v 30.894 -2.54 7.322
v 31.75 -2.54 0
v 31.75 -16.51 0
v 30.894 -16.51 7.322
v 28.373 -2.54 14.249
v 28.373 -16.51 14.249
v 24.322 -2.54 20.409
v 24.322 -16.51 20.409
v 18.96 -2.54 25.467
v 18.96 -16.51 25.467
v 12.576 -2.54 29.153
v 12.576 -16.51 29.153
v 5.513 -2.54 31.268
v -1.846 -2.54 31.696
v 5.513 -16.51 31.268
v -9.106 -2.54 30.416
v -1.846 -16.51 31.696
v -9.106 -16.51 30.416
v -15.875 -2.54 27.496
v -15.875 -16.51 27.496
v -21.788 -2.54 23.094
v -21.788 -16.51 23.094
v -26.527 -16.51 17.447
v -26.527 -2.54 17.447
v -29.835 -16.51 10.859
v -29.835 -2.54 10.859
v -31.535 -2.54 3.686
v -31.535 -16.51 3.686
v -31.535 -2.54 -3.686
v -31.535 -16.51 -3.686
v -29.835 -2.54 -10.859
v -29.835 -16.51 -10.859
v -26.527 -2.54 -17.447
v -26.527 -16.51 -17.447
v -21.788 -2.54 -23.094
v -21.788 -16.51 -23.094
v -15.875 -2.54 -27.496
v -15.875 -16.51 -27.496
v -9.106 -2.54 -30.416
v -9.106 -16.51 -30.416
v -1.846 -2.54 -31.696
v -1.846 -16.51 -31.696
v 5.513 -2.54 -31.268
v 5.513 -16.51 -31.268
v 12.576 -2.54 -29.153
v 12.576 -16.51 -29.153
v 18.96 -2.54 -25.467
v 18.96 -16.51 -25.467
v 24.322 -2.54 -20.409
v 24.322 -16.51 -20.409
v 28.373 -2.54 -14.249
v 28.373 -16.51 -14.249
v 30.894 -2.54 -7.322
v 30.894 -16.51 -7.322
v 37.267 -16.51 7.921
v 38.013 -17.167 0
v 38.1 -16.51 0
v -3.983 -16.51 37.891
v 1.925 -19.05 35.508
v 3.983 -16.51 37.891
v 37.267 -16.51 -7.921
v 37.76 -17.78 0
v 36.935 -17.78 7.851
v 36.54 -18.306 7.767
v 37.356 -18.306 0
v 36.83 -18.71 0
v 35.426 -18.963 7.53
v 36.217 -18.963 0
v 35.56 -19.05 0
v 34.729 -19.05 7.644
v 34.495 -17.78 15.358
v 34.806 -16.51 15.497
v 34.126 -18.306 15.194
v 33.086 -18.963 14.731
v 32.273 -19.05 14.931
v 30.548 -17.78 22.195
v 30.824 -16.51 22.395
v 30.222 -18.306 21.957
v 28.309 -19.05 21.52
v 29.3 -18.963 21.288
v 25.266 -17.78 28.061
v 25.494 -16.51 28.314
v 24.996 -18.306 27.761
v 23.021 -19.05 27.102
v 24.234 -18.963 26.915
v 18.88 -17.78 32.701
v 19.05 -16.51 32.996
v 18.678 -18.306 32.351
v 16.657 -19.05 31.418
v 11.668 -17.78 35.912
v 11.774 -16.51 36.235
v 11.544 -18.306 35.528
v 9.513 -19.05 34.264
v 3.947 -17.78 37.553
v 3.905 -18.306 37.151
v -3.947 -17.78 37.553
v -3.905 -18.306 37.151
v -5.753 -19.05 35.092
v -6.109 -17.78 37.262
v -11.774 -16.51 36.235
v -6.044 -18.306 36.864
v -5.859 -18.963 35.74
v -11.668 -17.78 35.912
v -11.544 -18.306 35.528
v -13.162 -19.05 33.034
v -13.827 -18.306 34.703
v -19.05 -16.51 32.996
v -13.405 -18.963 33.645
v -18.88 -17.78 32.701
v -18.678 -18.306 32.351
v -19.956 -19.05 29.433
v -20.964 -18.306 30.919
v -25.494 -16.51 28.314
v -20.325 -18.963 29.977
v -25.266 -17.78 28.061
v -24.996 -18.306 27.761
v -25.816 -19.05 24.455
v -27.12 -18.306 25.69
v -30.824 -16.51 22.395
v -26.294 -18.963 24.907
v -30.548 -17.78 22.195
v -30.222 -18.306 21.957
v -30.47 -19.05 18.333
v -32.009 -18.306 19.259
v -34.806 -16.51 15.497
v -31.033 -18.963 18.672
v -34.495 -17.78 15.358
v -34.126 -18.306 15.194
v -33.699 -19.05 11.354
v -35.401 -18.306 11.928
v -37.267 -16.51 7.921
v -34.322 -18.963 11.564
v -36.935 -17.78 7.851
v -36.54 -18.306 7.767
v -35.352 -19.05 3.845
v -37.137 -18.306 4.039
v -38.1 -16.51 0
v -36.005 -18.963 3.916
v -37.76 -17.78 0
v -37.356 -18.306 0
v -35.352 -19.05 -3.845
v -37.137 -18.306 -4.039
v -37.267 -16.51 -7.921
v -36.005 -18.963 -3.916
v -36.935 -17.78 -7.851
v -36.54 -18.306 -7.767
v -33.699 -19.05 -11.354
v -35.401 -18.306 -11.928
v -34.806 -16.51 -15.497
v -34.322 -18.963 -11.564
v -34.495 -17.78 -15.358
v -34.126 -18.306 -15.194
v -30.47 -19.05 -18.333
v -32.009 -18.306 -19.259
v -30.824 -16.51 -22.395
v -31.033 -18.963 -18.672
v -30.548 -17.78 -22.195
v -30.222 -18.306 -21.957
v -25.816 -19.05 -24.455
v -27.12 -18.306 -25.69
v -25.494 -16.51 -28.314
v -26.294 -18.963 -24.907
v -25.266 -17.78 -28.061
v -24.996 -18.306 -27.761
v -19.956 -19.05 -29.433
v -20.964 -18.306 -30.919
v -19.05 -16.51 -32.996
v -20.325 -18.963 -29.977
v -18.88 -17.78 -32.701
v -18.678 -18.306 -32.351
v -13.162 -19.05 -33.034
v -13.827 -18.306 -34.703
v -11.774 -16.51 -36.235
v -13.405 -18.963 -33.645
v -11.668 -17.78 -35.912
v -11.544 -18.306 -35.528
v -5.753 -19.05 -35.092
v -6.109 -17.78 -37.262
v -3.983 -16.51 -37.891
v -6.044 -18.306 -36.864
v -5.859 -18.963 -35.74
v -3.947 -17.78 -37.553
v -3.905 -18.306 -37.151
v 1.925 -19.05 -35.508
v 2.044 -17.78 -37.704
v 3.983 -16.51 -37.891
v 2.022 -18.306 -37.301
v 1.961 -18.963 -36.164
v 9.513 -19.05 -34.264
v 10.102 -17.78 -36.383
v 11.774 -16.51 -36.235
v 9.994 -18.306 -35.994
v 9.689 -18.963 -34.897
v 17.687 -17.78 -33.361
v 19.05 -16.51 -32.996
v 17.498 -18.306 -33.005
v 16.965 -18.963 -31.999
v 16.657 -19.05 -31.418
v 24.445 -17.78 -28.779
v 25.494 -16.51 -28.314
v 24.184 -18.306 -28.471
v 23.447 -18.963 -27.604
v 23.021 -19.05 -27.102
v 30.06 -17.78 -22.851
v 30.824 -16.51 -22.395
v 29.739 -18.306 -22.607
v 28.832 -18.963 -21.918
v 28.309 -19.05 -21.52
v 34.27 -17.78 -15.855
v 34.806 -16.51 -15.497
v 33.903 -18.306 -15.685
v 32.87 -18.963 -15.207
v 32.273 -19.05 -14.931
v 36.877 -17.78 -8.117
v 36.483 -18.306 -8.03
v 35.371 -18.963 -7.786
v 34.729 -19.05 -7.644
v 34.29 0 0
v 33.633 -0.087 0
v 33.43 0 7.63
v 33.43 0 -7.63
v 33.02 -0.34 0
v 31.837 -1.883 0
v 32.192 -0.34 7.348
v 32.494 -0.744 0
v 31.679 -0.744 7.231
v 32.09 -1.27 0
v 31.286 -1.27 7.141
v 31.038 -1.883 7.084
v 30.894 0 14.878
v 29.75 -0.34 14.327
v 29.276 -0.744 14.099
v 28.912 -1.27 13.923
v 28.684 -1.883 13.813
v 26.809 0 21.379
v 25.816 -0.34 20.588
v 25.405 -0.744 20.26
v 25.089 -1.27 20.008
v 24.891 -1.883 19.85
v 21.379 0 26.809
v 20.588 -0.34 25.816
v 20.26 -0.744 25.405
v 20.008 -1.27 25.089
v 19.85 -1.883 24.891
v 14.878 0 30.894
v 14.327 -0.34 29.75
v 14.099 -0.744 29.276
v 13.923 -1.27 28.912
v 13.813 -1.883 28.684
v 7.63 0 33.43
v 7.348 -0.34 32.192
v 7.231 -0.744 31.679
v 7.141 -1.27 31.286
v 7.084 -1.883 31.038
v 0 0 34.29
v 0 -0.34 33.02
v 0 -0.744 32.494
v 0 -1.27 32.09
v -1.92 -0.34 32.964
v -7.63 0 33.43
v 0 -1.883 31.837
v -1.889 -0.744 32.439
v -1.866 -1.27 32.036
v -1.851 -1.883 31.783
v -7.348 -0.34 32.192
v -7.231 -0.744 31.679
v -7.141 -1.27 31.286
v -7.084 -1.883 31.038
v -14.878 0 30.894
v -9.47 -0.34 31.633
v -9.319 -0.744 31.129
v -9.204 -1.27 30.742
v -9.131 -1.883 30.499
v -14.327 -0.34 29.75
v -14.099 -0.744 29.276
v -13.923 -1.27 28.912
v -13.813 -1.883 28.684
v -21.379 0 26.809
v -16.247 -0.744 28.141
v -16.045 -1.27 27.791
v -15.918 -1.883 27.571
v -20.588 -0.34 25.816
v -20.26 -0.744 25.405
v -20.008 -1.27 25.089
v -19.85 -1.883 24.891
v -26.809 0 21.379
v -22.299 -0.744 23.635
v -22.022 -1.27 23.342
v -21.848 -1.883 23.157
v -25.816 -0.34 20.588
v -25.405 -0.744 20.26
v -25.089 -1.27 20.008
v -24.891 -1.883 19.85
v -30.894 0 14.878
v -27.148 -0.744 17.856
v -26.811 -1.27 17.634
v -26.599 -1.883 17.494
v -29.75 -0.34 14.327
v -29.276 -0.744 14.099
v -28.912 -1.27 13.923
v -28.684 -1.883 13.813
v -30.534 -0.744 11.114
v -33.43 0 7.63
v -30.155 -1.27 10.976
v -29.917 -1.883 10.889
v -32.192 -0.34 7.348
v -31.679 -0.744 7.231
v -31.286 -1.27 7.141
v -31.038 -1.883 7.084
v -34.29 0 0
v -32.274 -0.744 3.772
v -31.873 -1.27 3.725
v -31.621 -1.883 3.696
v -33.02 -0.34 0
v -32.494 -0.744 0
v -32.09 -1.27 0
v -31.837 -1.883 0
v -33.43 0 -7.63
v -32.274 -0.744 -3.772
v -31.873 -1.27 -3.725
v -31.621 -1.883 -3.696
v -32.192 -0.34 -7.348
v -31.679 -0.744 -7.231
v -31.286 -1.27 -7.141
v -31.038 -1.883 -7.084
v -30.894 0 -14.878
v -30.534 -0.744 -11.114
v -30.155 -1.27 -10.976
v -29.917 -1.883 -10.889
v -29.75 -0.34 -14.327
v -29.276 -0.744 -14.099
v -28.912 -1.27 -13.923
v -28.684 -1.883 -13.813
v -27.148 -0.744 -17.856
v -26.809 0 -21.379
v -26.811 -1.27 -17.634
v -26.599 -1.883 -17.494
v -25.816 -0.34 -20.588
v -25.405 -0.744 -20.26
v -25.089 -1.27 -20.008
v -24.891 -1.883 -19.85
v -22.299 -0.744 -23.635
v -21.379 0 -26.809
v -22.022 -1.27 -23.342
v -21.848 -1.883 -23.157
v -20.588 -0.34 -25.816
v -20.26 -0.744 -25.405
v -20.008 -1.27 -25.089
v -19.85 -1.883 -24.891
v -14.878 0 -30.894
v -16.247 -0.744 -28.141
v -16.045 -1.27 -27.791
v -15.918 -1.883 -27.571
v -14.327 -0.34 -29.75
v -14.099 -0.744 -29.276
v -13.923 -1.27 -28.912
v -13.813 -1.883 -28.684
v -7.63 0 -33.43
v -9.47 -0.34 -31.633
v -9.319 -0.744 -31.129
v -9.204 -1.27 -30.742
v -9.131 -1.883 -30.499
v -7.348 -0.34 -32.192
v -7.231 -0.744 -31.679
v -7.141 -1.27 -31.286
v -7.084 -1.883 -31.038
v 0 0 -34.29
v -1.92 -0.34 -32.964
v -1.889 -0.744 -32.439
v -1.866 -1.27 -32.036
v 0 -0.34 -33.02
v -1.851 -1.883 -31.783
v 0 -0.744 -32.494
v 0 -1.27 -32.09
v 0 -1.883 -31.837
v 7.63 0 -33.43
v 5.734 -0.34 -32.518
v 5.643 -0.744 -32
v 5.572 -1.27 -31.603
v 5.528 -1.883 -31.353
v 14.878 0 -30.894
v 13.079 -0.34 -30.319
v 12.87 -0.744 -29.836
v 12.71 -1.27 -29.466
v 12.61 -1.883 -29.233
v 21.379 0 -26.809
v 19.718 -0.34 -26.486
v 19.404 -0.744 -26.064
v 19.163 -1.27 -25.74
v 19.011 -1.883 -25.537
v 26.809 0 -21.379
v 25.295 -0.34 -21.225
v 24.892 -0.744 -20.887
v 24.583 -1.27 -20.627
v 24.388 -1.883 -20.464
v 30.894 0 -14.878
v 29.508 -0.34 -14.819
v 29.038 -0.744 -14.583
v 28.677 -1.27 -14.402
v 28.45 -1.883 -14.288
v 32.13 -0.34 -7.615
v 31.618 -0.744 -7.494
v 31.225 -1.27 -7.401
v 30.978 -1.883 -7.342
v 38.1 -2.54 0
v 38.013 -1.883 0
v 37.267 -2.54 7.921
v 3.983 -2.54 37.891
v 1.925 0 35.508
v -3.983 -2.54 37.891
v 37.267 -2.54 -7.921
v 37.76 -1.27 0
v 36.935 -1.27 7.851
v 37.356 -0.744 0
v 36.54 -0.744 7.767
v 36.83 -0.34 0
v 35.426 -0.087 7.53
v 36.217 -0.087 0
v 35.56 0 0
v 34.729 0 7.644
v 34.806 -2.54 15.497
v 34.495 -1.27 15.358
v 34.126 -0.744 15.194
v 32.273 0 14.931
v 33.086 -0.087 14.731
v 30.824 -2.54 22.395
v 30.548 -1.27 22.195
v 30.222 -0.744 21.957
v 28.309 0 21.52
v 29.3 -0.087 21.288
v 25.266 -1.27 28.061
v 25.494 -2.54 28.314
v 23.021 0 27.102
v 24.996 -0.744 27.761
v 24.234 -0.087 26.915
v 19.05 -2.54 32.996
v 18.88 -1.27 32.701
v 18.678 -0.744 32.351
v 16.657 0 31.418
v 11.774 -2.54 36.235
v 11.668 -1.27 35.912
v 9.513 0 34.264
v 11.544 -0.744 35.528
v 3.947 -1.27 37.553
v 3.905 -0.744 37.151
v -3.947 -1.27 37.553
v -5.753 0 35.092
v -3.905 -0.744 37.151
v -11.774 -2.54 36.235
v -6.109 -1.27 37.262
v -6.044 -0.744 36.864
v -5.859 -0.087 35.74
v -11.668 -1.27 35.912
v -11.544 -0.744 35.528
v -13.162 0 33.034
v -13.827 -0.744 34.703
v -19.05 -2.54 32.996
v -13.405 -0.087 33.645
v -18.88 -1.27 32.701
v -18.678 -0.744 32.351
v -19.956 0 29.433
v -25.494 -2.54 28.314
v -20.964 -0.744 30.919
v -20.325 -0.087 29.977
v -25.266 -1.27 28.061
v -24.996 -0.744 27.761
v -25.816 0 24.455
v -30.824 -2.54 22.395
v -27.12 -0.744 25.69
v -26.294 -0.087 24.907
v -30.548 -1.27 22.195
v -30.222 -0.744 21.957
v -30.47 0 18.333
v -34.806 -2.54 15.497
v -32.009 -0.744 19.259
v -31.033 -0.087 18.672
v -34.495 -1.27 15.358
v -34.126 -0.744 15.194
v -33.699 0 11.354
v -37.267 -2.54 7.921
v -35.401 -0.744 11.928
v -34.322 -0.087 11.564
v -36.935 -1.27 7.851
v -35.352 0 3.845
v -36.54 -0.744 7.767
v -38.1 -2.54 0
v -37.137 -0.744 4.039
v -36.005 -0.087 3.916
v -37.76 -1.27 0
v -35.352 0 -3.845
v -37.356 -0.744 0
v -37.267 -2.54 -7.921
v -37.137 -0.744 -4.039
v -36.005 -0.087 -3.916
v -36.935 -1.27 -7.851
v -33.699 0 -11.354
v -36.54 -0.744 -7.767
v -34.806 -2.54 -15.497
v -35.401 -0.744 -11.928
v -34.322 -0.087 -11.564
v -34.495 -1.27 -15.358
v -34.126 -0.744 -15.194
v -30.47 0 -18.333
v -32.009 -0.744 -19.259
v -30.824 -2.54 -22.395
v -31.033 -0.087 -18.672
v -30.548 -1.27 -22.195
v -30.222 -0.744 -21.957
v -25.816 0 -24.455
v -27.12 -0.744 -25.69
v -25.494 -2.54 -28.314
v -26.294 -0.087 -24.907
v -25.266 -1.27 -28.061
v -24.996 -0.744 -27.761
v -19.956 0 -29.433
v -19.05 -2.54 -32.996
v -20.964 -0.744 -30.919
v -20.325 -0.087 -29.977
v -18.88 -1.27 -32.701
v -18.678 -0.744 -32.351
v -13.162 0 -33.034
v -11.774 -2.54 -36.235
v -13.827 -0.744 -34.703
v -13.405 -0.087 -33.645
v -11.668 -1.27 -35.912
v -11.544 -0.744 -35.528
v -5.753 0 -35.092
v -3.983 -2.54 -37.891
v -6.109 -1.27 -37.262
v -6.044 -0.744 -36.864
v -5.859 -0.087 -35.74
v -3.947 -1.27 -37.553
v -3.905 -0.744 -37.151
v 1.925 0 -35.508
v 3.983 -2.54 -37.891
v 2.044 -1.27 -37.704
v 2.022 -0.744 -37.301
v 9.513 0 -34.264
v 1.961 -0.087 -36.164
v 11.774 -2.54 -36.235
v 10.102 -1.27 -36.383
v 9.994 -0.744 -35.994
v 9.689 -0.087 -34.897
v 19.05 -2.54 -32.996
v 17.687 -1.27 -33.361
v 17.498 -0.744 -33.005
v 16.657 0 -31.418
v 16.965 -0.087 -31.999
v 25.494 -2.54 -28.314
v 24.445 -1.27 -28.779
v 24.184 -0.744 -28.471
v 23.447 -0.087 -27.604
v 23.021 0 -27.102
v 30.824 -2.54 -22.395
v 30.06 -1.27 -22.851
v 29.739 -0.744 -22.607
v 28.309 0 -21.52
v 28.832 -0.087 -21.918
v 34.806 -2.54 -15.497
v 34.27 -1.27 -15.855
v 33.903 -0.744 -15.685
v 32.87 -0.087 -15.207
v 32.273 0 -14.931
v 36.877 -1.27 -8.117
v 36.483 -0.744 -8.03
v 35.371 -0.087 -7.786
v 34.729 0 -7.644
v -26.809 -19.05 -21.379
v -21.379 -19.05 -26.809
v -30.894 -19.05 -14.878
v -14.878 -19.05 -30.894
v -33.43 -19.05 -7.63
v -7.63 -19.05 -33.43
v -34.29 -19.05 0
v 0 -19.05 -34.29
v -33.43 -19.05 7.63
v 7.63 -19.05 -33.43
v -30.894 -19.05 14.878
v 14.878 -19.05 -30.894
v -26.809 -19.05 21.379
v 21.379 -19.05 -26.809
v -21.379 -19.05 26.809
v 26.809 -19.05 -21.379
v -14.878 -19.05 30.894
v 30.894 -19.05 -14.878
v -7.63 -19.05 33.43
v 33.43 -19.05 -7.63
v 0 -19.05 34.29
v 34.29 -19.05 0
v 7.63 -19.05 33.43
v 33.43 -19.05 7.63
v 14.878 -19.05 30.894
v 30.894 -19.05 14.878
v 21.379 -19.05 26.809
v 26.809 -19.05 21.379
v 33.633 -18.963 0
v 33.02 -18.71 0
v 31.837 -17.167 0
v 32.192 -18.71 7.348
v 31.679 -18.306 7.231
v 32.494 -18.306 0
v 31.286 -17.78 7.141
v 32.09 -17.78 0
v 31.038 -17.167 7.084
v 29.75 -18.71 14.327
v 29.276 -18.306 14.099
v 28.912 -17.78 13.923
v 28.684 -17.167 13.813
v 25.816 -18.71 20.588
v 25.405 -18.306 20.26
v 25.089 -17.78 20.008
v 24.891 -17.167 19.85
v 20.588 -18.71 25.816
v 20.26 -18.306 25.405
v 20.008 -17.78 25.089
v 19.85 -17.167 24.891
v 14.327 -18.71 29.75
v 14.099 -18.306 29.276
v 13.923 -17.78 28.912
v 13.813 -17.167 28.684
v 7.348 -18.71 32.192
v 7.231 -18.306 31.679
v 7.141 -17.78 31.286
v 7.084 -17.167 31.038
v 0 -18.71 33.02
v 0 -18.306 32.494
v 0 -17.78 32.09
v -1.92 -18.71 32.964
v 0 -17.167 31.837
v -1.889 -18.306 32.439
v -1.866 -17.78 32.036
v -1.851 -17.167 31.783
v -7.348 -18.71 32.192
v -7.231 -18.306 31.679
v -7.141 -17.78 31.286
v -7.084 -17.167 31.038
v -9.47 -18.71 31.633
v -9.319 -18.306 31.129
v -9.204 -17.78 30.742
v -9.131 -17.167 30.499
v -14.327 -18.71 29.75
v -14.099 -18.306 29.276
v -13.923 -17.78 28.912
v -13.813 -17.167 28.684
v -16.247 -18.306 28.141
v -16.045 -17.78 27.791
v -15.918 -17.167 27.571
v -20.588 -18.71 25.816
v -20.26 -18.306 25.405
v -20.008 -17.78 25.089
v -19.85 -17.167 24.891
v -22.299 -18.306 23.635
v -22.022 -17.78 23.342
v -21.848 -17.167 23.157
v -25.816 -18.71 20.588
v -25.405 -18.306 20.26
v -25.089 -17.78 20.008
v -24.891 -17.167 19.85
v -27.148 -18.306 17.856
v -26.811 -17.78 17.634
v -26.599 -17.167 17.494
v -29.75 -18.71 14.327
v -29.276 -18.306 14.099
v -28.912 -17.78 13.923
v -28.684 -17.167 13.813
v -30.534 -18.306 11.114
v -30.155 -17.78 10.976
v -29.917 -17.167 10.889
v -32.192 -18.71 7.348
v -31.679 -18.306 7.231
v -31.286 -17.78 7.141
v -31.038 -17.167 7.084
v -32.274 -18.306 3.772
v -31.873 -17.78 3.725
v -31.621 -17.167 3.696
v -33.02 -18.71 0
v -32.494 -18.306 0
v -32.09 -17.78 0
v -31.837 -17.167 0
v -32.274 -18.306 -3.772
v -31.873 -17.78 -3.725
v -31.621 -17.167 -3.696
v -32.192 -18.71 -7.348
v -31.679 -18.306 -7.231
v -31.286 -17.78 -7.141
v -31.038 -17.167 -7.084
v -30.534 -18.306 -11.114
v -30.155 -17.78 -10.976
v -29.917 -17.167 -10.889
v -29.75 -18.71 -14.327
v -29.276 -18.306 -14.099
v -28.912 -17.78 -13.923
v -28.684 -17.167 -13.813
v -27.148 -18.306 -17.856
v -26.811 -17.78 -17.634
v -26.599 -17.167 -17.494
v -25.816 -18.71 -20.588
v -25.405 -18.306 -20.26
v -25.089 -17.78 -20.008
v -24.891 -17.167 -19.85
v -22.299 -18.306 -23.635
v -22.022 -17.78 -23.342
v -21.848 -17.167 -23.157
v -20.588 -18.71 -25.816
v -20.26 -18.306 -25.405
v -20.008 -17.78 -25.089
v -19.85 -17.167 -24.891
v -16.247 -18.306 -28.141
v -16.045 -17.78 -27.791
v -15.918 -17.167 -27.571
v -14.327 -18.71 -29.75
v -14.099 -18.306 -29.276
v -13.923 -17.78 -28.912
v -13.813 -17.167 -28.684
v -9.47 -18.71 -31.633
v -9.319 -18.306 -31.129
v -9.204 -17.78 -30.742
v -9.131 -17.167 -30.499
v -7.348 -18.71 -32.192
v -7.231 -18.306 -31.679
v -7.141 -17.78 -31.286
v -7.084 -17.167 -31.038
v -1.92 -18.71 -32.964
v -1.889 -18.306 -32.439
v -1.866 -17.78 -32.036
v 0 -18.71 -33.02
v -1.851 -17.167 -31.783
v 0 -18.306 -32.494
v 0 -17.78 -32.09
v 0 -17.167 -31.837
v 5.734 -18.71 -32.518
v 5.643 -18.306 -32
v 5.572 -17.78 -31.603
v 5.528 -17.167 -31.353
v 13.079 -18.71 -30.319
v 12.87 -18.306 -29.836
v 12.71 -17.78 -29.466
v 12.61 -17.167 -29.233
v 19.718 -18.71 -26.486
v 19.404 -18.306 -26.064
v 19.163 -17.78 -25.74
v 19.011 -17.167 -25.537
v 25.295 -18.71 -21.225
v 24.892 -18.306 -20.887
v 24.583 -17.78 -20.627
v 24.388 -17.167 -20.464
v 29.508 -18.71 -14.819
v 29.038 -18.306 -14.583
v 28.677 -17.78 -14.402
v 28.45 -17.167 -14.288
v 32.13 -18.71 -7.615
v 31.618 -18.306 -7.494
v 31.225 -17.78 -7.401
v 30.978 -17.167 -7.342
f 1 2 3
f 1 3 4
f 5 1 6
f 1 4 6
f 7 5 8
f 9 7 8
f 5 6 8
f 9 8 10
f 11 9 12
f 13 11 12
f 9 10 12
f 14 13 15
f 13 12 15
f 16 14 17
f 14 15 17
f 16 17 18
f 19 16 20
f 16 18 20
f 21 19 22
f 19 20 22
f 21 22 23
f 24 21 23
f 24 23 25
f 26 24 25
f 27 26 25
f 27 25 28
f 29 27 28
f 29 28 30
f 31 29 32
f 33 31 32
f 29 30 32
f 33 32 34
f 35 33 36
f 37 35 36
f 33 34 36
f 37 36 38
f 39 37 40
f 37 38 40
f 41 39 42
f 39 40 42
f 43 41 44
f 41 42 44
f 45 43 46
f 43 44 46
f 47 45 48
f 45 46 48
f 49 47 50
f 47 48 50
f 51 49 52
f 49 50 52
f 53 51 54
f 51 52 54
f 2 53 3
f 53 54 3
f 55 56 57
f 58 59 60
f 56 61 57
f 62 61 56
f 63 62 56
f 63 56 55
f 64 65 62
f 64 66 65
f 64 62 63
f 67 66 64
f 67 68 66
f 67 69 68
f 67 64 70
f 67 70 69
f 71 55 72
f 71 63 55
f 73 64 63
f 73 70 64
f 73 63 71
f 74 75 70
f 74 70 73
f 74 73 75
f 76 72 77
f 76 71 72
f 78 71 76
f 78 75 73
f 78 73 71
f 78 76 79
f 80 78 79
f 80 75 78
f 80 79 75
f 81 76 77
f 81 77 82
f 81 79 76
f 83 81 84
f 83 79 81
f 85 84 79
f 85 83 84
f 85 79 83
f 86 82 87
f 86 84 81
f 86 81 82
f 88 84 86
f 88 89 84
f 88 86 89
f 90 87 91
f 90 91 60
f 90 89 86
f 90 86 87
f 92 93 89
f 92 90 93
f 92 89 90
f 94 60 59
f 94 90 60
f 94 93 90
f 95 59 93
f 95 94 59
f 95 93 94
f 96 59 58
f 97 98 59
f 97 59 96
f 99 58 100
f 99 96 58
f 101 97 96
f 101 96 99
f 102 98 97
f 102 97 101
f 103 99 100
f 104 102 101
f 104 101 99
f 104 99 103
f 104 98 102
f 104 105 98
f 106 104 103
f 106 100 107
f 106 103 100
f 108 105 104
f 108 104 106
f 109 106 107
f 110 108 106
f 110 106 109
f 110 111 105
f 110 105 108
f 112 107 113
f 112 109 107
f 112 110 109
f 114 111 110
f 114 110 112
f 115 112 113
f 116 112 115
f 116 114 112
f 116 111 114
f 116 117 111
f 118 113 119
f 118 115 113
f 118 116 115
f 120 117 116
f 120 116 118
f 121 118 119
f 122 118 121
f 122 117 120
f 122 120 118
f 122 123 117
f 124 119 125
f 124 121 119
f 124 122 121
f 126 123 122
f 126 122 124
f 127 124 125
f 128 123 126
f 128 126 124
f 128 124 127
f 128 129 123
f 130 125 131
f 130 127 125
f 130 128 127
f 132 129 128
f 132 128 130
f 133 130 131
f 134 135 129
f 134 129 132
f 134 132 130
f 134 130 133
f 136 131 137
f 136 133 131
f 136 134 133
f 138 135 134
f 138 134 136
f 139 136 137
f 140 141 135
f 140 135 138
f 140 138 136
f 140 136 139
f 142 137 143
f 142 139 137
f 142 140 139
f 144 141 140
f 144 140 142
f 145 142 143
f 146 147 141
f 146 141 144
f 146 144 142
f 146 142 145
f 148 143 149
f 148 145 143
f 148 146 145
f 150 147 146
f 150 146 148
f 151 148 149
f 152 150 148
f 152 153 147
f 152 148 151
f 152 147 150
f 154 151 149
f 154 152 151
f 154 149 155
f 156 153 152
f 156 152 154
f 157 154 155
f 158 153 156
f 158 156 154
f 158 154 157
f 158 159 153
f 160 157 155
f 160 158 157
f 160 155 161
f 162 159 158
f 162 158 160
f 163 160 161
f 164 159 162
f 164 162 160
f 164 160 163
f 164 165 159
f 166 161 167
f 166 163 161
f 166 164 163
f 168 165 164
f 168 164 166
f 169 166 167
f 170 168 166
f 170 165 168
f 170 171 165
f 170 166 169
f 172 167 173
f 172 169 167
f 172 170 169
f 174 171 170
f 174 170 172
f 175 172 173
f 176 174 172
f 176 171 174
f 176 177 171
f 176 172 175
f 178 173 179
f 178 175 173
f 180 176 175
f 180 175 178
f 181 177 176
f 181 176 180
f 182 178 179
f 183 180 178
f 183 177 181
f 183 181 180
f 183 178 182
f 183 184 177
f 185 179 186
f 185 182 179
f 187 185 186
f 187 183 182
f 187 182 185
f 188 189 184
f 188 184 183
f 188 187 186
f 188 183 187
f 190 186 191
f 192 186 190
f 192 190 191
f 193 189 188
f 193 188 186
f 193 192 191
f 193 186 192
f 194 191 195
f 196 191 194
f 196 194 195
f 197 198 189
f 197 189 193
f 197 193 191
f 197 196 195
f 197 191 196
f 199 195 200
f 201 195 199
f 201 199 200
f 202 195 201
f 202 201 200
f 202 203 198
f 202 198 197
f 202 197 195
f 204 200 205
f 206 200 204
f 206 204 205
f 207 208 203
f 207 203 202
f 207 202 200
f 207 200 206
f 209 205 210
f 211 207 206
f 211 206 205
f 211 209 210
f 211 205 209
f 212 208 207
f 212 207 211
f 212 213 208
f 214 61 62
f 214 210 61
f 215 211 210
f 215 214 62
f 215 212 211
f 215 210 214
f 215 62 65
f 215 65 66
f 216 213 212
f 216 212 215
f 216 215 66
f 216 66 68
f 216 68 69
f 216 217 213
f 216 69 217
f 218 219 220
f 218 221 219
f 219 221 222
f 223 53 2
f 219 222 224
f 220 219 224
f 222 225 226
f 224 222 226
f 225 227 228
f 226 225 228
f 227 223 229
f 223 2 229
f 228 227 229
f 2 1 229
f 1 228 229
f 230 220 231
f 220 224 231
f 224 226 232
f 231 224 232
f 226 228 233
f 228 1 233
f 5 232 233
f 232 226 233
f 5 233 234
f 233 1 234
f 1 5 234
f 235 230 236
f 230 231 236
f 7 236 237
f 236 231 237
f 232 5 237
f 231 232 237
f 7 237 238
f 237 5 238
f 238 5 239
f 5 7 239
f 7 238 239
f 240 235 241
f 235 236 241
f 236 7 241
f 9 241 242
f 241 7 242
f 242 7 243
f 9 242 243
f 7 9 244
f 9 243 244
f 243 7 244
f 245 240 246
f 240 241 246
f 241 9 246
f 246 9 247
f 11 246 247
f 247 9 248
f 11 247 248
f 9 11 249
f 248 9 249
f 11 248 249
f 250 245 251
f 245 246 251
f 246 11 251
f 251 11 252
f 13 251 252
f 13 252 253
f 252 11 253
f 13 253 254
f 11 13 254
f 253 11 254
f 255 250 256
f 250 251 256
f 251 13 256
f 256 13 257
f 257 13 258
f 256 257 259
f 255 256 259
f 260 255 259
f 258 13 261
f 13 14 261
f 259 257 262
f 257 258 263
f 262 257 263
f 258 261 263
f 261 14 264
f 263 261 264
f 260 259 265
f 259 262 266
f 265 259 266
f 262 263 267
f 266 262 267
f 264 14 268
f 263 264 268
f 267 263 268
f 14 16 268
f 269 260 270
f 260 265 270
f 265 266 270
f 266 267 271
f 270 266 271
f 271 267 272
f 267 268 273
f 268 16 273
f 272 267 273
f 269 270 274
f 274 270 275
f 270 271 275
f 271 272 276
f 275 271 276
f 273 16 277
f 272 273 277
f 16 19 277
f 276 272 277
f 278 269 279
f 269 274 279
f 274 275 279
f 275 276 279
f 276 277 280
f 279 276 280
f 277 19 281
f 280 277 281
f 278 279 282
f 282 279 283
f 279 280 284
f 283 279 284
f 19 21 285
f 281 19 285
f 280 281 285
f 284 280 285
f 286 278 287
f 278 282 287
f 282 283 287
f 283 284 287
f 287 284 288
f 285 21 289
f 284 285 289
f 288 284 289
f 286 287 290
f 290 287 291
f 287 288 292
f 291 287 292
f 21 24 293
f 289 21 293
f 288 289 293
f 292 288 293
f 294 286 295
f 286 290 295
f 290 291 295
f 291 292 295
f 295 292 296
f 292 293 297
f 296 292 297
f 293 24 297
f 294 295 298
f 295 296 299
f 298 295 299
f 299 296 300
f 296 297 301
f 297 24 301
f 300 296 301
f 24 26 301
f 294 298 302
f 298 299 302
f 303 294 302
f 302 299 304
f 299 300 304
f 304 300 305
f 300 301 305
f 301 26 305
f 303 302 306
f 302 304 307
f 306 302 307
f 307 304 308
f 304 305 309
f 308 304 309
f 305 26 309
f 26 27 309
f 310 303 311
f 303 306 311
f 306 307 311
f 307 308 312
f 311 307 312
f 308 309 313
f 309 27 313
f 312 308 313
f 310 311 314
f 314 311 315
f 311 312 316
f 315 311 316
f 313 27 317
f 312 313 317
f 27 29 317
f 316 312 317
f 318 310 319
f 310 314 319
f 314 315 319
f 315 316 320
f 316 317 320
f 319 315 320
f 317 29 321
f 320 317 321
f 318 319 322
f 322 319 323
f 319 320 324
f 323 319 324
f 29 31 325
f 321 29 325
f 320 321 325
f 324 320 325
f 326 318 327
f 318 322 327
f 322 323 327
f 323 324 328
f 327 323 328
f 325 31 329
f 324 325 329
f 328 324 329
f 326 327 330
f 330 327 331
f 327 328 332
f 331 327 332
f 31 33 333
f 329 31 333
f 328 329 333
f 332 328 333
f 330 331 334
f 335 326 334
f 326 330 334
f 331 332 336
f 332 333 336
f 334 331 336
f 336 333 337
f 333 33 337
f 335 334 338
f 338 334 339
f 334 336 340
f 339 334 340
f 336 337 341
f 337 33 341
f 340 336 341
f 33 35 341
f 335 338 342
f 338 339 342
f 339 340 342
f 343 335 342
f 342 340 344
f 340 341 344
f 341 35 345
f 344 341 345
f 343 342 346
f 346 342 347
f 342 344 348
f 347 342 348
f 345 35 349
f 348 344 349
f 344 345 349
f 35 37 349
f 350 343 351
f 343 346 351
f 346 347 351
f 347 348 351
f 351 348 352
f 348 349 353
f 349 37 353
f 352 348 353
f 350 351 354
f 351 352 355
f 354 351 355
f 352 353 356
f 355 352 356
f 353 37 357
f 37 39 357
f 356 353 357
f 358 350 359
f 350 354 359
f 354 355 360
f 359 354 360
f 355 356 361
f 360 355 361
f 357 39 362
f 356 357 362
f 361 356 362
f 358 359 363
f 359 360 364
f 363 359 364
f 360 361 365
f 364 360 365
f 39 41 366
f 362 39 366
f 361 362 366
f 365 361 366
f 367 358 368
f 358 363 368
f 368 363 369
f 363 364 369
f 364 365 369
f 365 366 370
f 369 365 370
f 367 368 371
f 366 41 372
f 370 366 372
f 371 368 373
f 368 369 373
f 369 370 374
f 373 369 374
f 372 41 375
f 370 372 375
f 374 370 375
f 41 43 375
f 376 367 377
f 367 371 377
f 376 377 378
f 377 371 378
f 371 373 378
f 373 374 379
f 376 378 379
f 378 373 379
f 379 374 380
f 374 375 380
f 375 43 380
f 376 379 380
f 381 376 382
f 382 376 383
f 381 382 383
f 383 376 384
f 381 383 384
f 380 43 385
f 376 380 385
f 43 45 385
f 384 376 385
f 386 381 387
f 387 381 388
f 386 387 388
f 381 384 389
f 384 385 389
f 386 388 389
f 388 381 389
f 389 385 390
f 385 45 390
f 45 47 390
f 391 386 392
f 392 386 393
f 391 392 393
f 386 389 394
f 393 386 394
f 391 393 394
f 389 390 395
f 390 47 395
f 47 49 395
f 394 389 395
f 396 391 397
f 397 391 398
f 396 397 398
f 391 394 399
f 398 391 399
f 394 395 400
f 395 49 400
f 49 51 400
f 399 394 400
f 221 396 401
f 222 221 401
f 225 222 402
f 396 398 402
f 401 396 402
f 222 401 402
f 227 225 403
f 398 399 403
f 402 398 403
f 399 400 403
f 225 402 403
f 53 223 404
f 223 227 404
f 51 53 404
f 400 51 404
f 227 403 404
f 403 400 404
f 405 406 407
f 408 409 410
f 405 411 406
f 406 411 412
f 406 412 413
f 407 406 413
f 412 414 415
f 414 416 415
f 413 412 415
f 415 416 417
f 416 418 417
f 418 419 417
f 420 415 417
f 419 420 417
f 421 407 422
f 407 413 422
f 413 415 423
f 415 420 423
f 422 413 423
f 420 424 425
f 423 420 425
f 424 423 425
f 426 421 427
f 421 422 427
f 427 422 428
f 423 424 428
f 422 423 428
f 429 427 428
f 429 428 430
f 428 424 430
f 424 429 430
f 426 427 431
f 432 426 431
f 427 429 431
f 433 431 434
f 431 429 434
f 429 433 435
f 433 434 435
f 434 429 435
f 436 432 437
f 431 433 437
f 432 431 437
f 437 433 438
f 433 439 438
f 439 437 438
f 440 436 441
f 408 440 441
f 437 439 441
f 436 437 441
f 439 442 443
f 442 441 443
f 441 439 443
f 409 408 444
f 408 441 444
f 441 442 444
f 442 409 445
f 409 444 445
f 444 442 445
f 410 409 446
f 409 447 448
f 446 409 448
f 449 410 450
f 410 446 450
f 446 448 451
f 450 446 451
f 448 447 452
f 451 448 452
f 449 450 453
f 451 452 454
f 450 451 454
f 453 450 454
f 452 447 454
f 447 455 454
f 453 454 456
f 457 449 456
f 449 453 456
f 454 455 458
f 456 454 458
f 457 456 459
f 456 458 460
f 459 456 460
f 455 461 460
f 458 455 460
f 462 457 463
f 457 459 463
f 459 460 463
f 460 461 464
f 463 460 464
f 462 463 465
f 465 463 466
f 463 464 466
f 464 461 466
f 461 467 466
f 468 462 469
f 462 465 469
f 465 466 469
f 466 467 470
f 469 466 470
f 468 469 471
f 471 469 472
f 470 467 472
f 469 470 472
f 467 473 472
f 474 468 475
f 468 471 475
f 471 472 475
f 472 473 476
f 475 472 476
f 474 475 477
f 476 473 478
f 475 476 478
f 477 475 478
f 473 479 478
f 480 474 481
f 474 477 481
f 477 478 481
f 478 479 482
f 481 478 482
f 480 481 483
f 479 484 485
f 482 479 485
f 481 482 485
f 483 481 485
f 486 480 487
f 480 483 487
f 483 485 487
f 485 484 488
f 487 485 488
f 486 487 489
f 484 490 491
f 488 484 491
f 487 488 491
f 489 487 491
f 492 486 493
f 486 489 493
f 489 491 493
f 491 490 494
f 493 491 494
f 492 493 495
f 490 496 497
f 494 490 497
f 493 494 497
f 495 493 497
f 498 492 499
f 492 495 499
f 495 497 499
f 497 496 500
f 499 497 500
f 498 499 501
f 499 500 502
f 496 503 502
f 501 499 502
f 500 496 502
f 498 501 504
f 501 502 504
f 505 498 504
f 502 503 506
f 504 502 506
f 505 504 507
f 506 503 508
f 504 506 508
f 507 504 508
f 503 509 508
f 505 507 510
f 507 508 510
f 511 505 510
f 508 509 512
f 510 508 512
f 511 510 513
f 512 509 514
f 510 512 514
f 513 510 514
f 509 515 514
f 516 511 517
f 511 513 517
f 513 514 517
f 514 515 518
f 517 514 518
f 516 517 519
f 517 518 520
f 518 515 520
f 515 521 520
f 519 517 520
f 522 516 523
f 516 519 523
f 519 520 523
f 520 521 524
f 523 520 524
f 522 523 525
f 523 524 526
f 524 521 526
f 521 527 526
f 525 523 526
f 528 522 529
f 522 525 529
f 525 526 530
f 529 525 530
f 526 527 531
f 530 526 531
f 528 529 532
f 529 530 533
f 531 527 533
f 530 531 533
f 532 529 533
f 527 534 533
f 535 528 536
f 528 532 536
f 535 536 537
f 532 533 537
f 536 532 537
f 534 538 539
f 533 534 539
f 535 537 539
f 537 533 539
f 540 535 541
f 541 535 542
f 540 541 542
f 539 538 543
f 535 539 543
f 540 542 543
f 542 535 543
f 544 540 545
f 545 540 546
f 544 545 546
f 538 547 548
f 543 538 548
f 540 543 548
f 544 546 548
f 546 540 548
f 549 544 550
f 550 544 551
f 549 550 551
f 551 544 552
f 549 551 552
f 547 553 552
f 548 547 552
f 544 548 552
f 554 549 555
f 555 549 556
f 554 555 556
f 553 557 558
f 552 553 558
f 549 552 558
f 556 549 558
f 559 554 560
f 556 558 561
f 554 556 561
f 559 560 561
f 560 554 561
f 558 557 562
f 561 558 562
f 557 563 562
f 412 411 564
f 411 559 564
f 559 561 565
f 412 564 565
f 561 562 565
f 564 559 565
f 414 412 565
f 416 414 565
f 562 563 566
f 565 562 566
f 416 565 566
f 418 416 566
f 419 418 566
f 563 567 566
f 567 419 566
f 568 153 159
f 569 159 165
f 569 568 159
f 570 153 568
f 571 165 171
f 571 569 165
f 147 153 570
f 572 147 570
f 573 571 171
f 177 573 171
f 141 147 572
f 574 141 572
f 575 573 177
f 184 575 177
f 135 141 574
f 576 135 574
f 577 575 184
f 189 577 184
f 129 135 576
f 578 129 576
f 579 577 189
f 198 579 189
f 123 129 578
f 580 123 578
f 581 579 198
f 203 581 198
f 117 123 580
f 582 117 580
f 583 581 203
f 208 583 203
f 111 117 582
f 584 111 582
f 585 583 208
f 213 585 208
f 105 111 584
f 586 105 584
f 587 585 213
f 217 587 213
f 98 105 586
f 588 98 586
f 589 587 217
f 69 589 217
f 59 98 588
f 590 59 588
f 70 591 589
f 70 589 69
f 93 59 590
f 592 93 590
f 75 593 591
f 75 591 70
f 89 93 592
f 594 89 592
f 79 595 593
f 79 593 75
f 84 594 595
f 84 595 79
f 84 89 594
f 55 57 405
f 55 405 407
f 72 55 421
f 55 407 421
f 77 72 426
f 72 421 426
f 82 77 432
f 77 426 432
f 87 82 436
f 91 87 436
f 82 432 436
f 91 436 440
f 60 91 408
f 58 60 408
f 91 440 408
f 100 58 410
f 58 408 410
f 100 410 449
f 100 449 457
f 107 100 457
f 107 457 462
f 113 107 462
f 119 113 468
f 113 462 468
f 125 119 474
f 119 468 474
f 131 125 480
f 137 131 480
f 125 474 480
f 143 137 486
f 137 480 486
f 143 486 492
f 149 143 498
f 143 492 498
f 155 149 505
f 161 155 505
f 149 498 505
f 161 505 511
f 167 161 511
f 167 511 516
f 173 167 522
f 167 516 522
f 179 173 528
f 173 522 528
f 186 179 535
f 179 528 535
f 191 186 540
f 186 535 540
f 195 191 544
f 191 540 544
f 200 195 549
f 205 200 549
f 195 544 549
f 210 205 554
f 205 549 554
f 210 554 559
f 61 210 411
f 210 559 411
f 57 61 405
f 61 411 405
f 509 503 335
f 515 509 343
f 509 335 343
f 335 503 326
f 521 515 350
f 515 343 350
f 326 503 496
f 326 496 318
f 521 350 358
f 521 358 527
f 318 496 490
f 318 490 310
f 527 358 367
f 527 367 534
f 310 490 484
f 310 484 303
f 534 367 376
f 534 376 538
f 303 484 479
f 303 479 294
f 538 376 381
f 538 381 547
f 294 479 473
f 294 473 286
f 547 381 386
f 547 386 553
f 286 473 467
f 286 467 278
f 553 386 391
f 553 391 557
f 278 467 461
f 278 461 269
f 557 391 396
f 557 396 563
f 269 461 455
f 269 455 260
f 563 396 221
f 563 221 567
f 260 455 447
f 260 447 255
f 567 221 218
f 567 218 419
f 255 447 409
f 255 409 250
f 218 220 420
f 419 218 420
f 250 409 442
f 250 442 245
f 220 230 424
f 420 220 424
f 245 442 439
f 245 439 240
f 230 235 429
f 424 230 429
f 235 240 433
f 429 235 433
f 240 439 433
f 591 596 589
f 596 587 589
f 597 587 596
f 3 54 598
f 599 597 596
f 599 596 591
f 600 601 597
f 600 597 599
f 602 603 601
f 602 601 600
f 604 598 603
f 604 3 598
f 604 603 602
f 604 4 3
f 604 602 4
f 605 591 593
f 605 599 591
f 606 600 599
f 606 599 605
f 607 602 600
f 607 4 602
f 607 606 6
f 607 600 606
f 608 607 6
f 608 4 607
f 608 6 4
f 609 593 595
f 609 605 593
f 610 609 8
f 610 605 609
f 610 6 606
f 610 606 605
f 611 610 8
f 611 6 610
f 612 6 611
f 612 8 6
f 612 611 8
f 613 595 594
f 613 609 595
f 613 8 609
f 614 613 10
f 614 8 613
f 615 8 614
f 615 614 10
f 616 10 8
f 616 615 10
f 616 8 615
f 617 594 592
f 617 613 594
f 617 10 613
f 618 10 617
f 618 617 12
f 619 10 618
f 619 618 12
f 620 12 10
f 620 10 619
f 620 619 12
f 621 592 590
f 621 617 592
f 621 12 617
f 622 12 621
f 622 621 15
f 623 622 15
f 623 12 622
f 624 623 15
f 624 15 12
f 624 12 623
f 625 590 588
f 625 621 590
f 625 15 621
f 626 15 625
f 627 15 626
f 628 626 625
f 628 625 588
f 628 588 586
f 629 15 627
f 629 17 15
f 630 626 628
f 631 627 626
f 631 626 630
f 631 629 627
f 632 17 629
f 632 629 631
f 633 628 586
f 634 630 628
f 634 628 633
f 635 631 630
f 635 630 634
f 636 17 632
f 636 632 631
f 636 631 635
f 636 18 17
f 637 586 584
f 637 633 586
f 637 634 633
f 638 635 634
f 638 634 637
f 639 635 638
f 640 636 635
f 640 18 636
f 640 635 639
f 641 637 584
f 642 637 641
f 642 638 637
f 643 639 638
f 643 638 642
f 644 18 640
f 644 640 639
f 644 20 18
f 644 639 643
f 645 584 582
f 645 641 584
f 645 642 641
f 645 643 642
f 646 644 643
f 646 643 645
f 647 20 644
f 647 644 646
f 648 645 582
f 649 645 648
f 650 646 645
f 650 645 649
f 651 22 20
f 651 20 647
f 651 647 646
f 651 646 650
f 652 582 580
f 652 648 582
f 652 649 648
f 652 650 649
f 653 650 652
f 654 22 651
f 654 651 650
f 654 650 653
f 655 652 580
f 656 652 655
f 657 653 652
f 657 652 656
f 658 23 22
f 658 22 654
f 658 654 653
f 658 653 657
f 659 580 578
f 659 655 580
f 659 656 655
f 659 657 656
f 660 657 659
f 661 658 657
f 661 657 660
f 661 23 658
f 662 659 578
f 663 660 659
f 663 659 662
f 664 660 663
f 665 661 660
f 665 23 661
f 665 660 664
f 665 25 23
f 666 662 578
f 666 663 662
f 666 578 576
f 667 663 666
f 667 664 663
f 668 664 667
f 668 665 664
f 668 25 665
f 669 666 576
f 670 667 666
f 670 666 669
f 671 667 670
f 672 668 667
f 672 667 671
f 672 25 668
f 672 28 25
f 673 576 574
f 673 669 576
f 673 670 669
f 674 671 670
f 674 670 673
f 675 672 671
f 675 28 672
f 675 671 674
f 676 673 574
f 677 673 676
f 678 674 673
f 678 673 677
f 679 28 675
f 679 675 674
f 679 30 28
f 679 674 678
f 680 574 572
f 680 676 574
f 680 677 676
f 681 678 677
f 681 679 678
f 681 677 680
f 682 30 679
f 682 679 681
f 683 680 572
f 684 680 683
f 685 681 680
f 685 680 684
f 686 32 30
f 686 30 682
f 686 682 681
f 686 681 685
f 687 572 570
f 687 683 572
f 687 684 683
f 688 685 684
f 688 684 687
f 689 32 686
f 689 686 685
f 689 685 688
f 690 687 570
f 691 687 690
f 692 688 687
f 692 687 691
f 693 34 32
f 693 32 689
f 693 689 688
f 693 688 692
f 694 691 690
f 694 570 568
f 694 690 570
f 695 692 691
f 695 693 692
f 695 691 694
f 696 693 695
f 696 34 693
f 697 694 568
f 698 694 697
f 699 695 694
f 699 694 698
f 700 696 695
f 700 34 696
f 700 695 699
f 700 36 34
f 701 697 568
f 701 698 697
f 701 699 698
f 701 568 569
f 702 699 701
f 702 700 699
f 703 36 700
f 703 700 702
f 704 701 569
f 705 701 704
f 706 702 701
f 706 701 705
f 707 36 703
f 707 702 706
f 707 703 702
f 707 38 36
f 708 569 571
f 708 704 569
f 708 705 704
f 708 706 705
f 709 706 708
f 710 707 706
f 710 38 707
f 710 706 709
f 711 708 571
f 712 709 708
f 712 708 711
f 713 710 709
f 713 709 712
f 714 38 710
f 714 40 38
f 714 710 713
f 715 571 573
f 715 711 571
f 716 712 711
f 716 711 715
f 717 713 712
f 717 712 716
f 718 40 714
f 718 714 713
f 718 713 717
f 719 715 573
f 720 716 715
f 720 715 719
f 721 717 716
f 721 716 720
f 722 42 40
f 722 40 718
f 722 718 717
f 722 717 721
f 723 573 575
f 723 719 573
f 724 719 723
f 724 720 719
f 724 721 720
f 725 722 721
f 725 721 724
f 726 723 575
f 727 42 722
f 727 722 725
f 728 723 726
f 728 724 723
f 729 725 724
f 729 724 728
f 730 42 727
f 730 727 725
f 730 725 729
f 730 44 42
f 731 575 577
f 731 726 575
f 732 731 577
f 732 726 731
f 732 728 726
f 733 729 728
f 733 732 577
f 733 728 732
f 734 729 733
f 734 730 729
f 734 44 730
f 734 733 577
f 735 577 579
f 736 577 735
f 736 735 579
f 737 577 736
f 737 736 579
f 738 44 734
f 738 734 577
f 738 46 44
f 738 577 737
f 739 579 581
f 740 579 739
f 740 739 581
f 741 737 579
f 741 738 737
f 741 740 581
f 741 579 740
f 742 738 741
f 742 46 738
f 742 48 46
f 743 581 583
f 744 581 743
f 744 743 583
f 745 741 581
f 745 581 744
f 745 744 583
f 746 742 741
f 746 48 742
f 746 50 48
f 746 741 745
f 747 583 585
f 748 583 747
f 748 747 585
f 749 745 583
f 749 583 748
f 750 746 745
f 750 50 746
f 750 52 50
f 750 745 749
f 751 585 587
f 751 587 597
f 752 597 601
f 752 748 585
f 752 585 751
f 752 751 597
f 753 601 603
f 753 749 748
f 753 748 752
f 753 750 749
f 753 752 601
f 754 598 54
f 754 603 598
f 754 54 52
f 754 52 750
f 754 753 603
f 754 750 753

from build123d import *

# Parameters (mm, degrees)
F0_R     = 38.1
F1_DEPTH = 19.05
F2_R     = 31.75
F3_DEPTH = 19.05
F4_R     = 2.54
F5_R     = 2.54


with BuildPart() as f1:
    # F0 (on Front) → F1 (new body)
    with BuildSketch(Plane.XZ):
        Circle(F0_R)
    extrude(amount=F1_DEPTH)

    # F2 (on face) → F3 (cut, through all)
    with BuildSketch(Plane.XZ.offset(19.05)):
        Circle(F2_R)
    extrude(amount=-F3_DEPTH, mode=Mode.SUBTRACT)

    # F4
    f4_edges = [f1.edges().sort_by_distance(p)[0] for p in [
        (-38.1, -19.05, 0),
    ]]
    fillet(f4_edges, radius=F4_R)

    # F5
    f5_edges = [f1.edges().sort_by_distance(p)[0] for p in [
        (-31.75, -19.05, 0),
        (-38.1, 0, 0),
        (-31.75, 0, 0),
    ]]
    fillet(f5_edges, radius=F5_R)


solid = f1.part
